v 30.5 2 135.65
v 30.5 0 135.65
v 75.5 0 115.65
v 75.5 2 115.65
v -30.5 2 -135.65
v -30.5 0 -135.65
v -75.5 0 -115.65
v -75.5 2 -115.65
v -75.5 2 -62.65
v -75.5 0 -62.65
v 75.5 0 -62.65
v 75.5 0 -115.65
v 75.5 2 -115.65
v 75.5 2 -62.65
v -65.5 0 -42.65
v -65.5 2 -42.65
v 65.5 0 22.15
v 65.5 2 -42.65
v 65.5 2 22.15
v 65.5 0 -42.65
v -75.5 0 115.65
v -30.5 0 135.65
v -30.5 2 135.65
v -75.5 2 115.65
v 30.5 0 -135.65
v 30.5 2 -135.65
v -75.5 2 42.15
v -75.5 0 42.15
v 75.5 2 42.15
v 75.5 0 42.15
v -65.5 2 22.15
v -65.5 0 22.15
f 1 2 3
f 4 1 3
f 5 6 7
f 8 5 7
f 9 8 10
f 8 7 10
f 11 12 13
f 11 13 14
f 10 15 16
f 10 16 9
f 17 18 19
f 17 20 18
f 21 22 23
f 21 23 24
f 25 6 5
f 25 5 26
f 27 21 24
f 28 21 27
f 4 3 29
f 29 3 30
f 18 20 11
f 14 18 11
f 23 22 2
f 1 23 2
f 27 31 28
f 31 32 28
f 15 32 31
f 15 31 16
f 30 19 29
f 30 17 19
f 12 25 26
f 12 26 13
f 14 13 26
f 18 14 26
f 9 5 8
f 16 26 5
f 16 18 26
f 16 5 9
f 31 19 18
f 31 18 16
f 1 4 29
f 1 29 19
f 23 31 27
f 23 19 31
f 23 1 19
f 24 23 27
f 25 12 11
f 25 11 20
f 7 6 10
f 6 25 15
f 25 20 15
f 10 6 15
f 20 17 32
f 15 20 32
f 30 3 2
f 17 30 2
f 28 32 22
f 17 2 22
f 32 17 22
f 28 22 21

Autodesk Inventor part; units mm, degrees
ref_plane "YZ Plane" through (0, 0, 0) normal (1, 0, 0) x (0, 1, 0)
ref_plane "XZ Plane" through (0, 0, 0) normal (0, 1, 0) x (-1, 0, 0)
ref_plane "XY Plane" through (0, 0, 0) normal (0, 0, 1) x (1, 0, 0)
sketch "Sketch1" plane through (0, 0, 0) normal (0, 1, 0) x (-1, 0, 0)
  line L0 (-75.5, -115.65) -> (-75.5, -62.65)
  line L1 (-65.5, -42.65) -> (-75.5, -62.65)
  line L2 (75.5, -115.65) -> (75.5, -62.65)
  line L3 (65.5, -42.65) -> (75.5, -62.65)
  line L4 (-75.5, 115.65) -> (-75.5, 42.15)
  line L5 (-65.5, 22.15) -> (-75.5, 42.15)
  line L6 (75.5, 115.65) -> (75.5, 42.15)
  line L7 (65.5, 22.15) -> (75.5, 42.15)
  line L8 (30.5, 135.65) -> (75.5, 115.65)
  line L9 (-30.5, 135.65) -> (-75.5, 115.65)
  line L10 (30.5, -135.65) -> (75.5, -115.65)
  line L11 (-30.5, -135.65) -> (-75.5, -115.65)
  line L12 (65.5, 22.15) -> (65.5, -42.65)
  line L13 (-65.5, -42.65) -> (-65.5, 22.15)
  line L14 (30.5, -135.65) -> (-30.5, -135.65)
  line L15 (30.5, 135.65) -> (-30.5, 135.65)
extrude "Extrusion1" add sketch "Sketch1" along normal blind 2
sketch "Sketch2" plane through (0, 2, 0) normal (0, 1, 0) x (1, 0, 0)
  line L0 (75.5, 62.65) -> (75.5, 115.65) projected
  line L1 (75.5, 115.65) -> (30.5, 135.65) projected
  line L2 (30.5, 135.65) -> (-30.5, 135.65) projected
  line L3 (-30.5, 135.65) -> (-75.5, 115.65) projected
  line L4 (-75.5, 115.65) -> (-75.5, 62.65) projected
  line L5 (-75.5, 62.65) -> (-65.5, 42.65) projected
  line L6 (-65.5, 42.65) -> (-65.5, -22.15) projected
  line L7 (-65.5, -22.15) -> (-75.5, -42.15) projected
  line L8 (-75.5, -115.65) -> (-30.5, -135.65) projected
  line L9 (-30.5, -135.65) -> (30.5, -135.65) projected
  line L10 (30.5, -135.65) -> (75.5, -115.65) projected
  line L11 (75.5, -115.65) -> (75.5, -42.15) projected
  line L12 (75.5, -42.15) -> (65.5, -22.15) projected
  line L13 (65.5, -22.15) -> (65.5, 42.65) projected
  line L14 (65.5, 42.65) -> (75.5, 62.65) projected
  line L15 (-75.5, -115.65) -> (75.5, -115.65)
  line L16 (-75.5, -42.15) -> (75.5, -42.15)
  line L17 (-75.5, 62.65) -> (75.5, 62.65)
  line L18 (-75.5, 115.65) -> (75.5, 115.65)
  line L19 (-75.5, 115.65) -> (-75.5, 105.65)
  line L20 (-75.5, 105.65) -> (75.5, 105.65)
  line L21 (75.5, 115.65) -> (75.5, 105.65)
  line L22 (-75.5, 62.65) -> (-75.5, 72.65)
  line L23 (-75.5, 72.65) -> (75.5, 72.65)
  line L24 (75.5, 62.65) -> (75.5, 72.65)
  line L25 (-75.5, -115.65) -> (-75.5, -105.65)
  line L26 (-75.5, -105.65) -> (75.5, -105.65)
  line L27 (75.5, -105.65) -> (75.5, -115.65)
  line L28 (-75.5, -62.65) -> (75.5, -62.65)
  line L29 (-65.5, 42.65) -> (-65.5, 120.0944)
  line L30 (65.5, 42.65) -> (65.5, 120.0944)
  line L31 (-65.5, -22.15) -> (-65.5, -120.0944)
  line L32 (65.5, -22.15) -> (65.5, -120.0944)
  line L33 (75.5, -62.65) -> (75.5, -72.65)
  line L34 (75.5, -72.65) -> (-75.5, -72.65)
  line L35 (-75.5, -62.65) -> (-75.5, -72.65)
  line L36 (-75.5, -42.15) -> (-75.5, -115.65)
  line L37 (65.5, -62.65) -> (40.6, -62.65)
  line L38 (40.6, -62.65) -> (40.6, -115.65)
  line L39 (40.6, -115.65) -> (50.6, -115.65)
  line L40 (50.6, -115.65) -> (50.6, -62.65)
  line L41 (50.6, -62.65) -> (40.6, -62.65)
  line L42 (-65.5, -62.65) -> (-40.6, -62.65)
  line L43 (-40.6, -62.65) -> (-40.6, -115.65)
  line L44 (-40.6, -115.65) -> (-50.6, -115.65)
  line L45 (-50.6, -115.65) -> (-50.6, -62.65)
  line L46 (-50.6, -62.65) -> (-40.6, -62.65)
  line L47 (-65.5, 115.65) -> (-40.6, 115.65)
  line L48 (-40.6, 115.65) -> (-40.6, 62.65)
  line L49 (-40.6, 62.65) -> (-50.6, 62.65)
  line L50 (-50.6, 62.65) -> (-50.6, 115.65)
  line L51 (-50.6, 115.65) -> (-40.6, 115.65)
  line L52 (65.5, 115.65) -> (40.6, 115.65)
  line L53 (40.6, 115.65) -> (40.6, 62.65)
  line L54 (40.6, 62.65) -> (50.6, 62.65)
  line L55 (50.6, 62.65) -> (50.6, 115.65)
  line L56 (50.6, 115.65) -> (40.6, 115.65)
  line L57 (-65.5, 12.65) -> (65.5, 12.65)
  line L58 (65.5, 12.65) -> (65.5, 22.65)
  line L59 (65.5, 22.65) -> (-65.5, 22.65)
  line L60 (-65.5, 22.65) -> (-65.5, 12.65)
  line L61 (0, 12.65) -> (0, -42.15)
  line L62 (-65.5, -42.15) -> (-65.5, 5.85)
  line L63 (-65.5, 5.85) -> (65.5, 5.85)
  line L64 (65.5, 5.85) -> (65.5, -42.15)
  line L65 (-65.5, -42.15) -> (-65.5, -40.15)
  line L66 (-65.5, -40.15) -> (65.5, -40.15)
  line L67 (65.5, -40.15) -> (65.5, -42.15)
  circle A0 centre (-70.5, 110.65) radius 1.2
  circle A1 centre (-70.5, 67.65) radius 1.2
  circle A2 centre (70.5, 110.65) radius 1.2
  circle A3 centre (70.5, 67.65) radius 1.2
  line L68 (-65.5, 115.65) -> (-24.1, 115.65)
  line L69 (65.5, 115.65) -> (24.1, 115.65)
  line L70 (-65.5, 72.65) -> (0, 72.65)
  line L71 (0, 22.65) -> (0, 17.65)
  circle A4 centre (0, 17.65) radius 1.2
  line L72 (-65.5, 22.65) -> (-60.5, 22.65)
  line L73 (-60.5, 22.65) -> (-60.5, 17.65)
  circle A5 centre (-60.5, 17.65) radius 1.2
  line L74 (65.5, 22.65) -> (60.5, 22.65)
  line L75 (60.5, 22.65) -> (60.5, 17.65)
  circle A6 centre (60.5, 17.65) radius 1.2
  line L76 (0, 5.85) -> (0, -17.15)
  line L77 (0, -17.15) -> (-32.15, -17.15)
  line L78 (0, -17.15) -> (32.15, -17.15)
  circle A7 centre (-32.15, -17.15) radius 1.2
  circle A8 centre (32.15, -17.15) radius 1.2
  line L79 (75.5, -42.15) -> (70.5, -42.15)
  circle A9 centre (70.5, -42.15) radius 1.2
  circle A10 centre (70.5, -67.65) radius 1.2
  circle A11 centre (70.5, -110.65) radius 1.2
  circle A12 centre (-70.5, -67.65) radius 1.2
  circle A13 centre (-70.5, -110.65) radius 1.2
  line L80 (-75.5, -42.15) -> (-70.5, -42.15)
  circle A14 centre (-70.5, -42.15) radius 1.2
  line L81 (0, -62.65) -> (0, -67.65)
  circle A15 centre (0, -67.65) radius 1.2
  line L82 (0, 115.65) -> (0, 110.65)
  circle A16 centre (0, 110.65) radius 1.2
  line L83 (-65.5, 72.65) -> (-24.1, 72.65)
  line L84 (-24.1, 72.65) -> (-24.1, 67.65)
  line L85 (65.5, 72.65) -> (24.1, 72.65)
  line L86 (24.1, 72.65) -> (24.1, 67.65)
  circle A17 centre (-24.1, 67.65) radius 1.2
  circle A18 centre (24.1, 67.65) radius 1.2
  line L87 (-65.5, -105.65) -> (-24.1, -105.65)
  line L88 (-24.1, -105.65) -> (-24.1, -110.65)
  line L89 (65.5, -105.65) -> (24.1, -105.65)
  line L90 (24.1, -105.65) -> (24.1, -110.65)
  circle A19 centre (-24.1, -110.65) radius 1.2
  circle A20 centre (24.1, -110.65) radius 1.2
  line L91 (-50.6, -62.65) -> (-50.6, -89.15)
  line L92 (-50.6, -89.15) -> (-45.6, -89.15)
  line L93 (40.6, -62.65) -> (40.6, -89.15)
  line L94 (40.6, -89.15) -> (45.6, -89.15)
  line L95 (40.6, 115.65) -> (40.6, 89.15)
  line L96 (40.6, 89.15) -> (45.6, 89.15)
  line L97 (-50.6, 115.65) -> (-50.6, 89.15)
  line L98 (-50.6, 89.15) -> (-45.6, 89.15)
  circle A21 centre (-45.6, 89.15) radius 1.2
  circle A22 centre (45.6, 89.15) radius 1.2
  circle A23 centre (45.6, -89.15) radius 1.2
  circle A24 centre (-45.6, -89.15) radius 1.2
  point P0 (0, 0)
  dimension "d26" = 10
  dimension "d27" = 10
  dimension "d28" = 10
  dimension "d29" = 53
  dimension "d30" = 10
  dimension "d31" = 24.9
  dimension "d32" = 53
  dimension "d33" = 10
  dimension "d35" = 24.9
  dimension "d36" = 10
  dimension "d37" = 53
  dimension "d38" = 24.9
  dimension "d39" = 53
  dimension "d40" = 10
  dimension "d41" = 53
  dimension "d42" = 24.9
  dimension "d43" = 53
  dimension "d44" = 10
  dimension "d45" = 53
  dimension "d47" = 131
  dimension "d48" = 10
  dimension "d49" = 131
  dimension "d50" = 54.8
  dimension "d51" = 48
  dimension "d52" = 131
  dimension "d53" = 2
  dimension "d54" = 131
  dimension "d68" = 5
  dimension "d70" = 5
  dimension "d71" = 5
  dimension "d73" = 5
  dimension "d74" = 5
  dimension "d76" = 23
  dimension "d77" = 32.15
  dimension "d78" = 32.15
  dimension "d86" = 5
  dimension "d88" = 5
  dimension "d90" = 5
  dimension "d92" = 41.4
  dimension "d93" = 5
  dimension "d94" = 41.4
  dimension "d98" = 41.4
  dimension "d99" = 5
  dimension "d100" = 41.4
  dimension "d101" = 5
  dimension "d104" = 26.5
  dimension "d105" = 5
  dimension "d106" = 26.5
  dimension "d107" = 5
  dimension "d108" = 26.5
  dimension "d109" = 5
  dimension "d110" = 26.5
  dimension "d111" = 5
sketch "Sketch3" plane through (0, 2, 0) normal (0, 1, 0) x (1, 0, 0)
  line L0 (75.5, 62.65) -> (75.5, 115.65) projected
  line L1 (75.5, 115.65) -> (30.5, 135.65) projected
  line L2 (30.5, 135.65) -> (-30.5, 135.65) projected
  line L3 (-30.5, 135.65) -> (-75.5, 115.65) projected
  line L4 (-75.5, 115.65) -> (-75.5, 62.65) projected
  line L5 (-75.5, 62.65) -> (-65.5, 42.65) projected
  line L6 (-65.5, 42.65) -> (-65.5, -22.15) projected
  line L7 (-65.5, -22.15) -> (-75.5, -42.15) projected
  line L8 (-75.5, -42.15) -> (-75.5, -115.65) projected
  line L9 (-75.5, -115.65) -> (-30.5, -135.65) projected
  line L10 (-30.5, -135.65) -> (30.5, -135.65) projected
  line L11 (30.5, -135.65) -> (75.5, -115.65) projected
  line L12 (75.5, -115.65) -> (75.5, -42.15) projected
  line L13 (75.5, -42.15) -> (65.5, -22.15) projected
  line L14 (65.5, -22.15) -> (65.5, 42.65) projected
  line L15 (65.5, 42.65) -> (75.5, 62.65) projected
  point P0 (0, 0)
  dimension "d116" = 271.3
  dimension "d117" = 151
  dimension "d118" = 64.8
  dimension "d119" = 20
properties part number "podvozek_+_prametry"
